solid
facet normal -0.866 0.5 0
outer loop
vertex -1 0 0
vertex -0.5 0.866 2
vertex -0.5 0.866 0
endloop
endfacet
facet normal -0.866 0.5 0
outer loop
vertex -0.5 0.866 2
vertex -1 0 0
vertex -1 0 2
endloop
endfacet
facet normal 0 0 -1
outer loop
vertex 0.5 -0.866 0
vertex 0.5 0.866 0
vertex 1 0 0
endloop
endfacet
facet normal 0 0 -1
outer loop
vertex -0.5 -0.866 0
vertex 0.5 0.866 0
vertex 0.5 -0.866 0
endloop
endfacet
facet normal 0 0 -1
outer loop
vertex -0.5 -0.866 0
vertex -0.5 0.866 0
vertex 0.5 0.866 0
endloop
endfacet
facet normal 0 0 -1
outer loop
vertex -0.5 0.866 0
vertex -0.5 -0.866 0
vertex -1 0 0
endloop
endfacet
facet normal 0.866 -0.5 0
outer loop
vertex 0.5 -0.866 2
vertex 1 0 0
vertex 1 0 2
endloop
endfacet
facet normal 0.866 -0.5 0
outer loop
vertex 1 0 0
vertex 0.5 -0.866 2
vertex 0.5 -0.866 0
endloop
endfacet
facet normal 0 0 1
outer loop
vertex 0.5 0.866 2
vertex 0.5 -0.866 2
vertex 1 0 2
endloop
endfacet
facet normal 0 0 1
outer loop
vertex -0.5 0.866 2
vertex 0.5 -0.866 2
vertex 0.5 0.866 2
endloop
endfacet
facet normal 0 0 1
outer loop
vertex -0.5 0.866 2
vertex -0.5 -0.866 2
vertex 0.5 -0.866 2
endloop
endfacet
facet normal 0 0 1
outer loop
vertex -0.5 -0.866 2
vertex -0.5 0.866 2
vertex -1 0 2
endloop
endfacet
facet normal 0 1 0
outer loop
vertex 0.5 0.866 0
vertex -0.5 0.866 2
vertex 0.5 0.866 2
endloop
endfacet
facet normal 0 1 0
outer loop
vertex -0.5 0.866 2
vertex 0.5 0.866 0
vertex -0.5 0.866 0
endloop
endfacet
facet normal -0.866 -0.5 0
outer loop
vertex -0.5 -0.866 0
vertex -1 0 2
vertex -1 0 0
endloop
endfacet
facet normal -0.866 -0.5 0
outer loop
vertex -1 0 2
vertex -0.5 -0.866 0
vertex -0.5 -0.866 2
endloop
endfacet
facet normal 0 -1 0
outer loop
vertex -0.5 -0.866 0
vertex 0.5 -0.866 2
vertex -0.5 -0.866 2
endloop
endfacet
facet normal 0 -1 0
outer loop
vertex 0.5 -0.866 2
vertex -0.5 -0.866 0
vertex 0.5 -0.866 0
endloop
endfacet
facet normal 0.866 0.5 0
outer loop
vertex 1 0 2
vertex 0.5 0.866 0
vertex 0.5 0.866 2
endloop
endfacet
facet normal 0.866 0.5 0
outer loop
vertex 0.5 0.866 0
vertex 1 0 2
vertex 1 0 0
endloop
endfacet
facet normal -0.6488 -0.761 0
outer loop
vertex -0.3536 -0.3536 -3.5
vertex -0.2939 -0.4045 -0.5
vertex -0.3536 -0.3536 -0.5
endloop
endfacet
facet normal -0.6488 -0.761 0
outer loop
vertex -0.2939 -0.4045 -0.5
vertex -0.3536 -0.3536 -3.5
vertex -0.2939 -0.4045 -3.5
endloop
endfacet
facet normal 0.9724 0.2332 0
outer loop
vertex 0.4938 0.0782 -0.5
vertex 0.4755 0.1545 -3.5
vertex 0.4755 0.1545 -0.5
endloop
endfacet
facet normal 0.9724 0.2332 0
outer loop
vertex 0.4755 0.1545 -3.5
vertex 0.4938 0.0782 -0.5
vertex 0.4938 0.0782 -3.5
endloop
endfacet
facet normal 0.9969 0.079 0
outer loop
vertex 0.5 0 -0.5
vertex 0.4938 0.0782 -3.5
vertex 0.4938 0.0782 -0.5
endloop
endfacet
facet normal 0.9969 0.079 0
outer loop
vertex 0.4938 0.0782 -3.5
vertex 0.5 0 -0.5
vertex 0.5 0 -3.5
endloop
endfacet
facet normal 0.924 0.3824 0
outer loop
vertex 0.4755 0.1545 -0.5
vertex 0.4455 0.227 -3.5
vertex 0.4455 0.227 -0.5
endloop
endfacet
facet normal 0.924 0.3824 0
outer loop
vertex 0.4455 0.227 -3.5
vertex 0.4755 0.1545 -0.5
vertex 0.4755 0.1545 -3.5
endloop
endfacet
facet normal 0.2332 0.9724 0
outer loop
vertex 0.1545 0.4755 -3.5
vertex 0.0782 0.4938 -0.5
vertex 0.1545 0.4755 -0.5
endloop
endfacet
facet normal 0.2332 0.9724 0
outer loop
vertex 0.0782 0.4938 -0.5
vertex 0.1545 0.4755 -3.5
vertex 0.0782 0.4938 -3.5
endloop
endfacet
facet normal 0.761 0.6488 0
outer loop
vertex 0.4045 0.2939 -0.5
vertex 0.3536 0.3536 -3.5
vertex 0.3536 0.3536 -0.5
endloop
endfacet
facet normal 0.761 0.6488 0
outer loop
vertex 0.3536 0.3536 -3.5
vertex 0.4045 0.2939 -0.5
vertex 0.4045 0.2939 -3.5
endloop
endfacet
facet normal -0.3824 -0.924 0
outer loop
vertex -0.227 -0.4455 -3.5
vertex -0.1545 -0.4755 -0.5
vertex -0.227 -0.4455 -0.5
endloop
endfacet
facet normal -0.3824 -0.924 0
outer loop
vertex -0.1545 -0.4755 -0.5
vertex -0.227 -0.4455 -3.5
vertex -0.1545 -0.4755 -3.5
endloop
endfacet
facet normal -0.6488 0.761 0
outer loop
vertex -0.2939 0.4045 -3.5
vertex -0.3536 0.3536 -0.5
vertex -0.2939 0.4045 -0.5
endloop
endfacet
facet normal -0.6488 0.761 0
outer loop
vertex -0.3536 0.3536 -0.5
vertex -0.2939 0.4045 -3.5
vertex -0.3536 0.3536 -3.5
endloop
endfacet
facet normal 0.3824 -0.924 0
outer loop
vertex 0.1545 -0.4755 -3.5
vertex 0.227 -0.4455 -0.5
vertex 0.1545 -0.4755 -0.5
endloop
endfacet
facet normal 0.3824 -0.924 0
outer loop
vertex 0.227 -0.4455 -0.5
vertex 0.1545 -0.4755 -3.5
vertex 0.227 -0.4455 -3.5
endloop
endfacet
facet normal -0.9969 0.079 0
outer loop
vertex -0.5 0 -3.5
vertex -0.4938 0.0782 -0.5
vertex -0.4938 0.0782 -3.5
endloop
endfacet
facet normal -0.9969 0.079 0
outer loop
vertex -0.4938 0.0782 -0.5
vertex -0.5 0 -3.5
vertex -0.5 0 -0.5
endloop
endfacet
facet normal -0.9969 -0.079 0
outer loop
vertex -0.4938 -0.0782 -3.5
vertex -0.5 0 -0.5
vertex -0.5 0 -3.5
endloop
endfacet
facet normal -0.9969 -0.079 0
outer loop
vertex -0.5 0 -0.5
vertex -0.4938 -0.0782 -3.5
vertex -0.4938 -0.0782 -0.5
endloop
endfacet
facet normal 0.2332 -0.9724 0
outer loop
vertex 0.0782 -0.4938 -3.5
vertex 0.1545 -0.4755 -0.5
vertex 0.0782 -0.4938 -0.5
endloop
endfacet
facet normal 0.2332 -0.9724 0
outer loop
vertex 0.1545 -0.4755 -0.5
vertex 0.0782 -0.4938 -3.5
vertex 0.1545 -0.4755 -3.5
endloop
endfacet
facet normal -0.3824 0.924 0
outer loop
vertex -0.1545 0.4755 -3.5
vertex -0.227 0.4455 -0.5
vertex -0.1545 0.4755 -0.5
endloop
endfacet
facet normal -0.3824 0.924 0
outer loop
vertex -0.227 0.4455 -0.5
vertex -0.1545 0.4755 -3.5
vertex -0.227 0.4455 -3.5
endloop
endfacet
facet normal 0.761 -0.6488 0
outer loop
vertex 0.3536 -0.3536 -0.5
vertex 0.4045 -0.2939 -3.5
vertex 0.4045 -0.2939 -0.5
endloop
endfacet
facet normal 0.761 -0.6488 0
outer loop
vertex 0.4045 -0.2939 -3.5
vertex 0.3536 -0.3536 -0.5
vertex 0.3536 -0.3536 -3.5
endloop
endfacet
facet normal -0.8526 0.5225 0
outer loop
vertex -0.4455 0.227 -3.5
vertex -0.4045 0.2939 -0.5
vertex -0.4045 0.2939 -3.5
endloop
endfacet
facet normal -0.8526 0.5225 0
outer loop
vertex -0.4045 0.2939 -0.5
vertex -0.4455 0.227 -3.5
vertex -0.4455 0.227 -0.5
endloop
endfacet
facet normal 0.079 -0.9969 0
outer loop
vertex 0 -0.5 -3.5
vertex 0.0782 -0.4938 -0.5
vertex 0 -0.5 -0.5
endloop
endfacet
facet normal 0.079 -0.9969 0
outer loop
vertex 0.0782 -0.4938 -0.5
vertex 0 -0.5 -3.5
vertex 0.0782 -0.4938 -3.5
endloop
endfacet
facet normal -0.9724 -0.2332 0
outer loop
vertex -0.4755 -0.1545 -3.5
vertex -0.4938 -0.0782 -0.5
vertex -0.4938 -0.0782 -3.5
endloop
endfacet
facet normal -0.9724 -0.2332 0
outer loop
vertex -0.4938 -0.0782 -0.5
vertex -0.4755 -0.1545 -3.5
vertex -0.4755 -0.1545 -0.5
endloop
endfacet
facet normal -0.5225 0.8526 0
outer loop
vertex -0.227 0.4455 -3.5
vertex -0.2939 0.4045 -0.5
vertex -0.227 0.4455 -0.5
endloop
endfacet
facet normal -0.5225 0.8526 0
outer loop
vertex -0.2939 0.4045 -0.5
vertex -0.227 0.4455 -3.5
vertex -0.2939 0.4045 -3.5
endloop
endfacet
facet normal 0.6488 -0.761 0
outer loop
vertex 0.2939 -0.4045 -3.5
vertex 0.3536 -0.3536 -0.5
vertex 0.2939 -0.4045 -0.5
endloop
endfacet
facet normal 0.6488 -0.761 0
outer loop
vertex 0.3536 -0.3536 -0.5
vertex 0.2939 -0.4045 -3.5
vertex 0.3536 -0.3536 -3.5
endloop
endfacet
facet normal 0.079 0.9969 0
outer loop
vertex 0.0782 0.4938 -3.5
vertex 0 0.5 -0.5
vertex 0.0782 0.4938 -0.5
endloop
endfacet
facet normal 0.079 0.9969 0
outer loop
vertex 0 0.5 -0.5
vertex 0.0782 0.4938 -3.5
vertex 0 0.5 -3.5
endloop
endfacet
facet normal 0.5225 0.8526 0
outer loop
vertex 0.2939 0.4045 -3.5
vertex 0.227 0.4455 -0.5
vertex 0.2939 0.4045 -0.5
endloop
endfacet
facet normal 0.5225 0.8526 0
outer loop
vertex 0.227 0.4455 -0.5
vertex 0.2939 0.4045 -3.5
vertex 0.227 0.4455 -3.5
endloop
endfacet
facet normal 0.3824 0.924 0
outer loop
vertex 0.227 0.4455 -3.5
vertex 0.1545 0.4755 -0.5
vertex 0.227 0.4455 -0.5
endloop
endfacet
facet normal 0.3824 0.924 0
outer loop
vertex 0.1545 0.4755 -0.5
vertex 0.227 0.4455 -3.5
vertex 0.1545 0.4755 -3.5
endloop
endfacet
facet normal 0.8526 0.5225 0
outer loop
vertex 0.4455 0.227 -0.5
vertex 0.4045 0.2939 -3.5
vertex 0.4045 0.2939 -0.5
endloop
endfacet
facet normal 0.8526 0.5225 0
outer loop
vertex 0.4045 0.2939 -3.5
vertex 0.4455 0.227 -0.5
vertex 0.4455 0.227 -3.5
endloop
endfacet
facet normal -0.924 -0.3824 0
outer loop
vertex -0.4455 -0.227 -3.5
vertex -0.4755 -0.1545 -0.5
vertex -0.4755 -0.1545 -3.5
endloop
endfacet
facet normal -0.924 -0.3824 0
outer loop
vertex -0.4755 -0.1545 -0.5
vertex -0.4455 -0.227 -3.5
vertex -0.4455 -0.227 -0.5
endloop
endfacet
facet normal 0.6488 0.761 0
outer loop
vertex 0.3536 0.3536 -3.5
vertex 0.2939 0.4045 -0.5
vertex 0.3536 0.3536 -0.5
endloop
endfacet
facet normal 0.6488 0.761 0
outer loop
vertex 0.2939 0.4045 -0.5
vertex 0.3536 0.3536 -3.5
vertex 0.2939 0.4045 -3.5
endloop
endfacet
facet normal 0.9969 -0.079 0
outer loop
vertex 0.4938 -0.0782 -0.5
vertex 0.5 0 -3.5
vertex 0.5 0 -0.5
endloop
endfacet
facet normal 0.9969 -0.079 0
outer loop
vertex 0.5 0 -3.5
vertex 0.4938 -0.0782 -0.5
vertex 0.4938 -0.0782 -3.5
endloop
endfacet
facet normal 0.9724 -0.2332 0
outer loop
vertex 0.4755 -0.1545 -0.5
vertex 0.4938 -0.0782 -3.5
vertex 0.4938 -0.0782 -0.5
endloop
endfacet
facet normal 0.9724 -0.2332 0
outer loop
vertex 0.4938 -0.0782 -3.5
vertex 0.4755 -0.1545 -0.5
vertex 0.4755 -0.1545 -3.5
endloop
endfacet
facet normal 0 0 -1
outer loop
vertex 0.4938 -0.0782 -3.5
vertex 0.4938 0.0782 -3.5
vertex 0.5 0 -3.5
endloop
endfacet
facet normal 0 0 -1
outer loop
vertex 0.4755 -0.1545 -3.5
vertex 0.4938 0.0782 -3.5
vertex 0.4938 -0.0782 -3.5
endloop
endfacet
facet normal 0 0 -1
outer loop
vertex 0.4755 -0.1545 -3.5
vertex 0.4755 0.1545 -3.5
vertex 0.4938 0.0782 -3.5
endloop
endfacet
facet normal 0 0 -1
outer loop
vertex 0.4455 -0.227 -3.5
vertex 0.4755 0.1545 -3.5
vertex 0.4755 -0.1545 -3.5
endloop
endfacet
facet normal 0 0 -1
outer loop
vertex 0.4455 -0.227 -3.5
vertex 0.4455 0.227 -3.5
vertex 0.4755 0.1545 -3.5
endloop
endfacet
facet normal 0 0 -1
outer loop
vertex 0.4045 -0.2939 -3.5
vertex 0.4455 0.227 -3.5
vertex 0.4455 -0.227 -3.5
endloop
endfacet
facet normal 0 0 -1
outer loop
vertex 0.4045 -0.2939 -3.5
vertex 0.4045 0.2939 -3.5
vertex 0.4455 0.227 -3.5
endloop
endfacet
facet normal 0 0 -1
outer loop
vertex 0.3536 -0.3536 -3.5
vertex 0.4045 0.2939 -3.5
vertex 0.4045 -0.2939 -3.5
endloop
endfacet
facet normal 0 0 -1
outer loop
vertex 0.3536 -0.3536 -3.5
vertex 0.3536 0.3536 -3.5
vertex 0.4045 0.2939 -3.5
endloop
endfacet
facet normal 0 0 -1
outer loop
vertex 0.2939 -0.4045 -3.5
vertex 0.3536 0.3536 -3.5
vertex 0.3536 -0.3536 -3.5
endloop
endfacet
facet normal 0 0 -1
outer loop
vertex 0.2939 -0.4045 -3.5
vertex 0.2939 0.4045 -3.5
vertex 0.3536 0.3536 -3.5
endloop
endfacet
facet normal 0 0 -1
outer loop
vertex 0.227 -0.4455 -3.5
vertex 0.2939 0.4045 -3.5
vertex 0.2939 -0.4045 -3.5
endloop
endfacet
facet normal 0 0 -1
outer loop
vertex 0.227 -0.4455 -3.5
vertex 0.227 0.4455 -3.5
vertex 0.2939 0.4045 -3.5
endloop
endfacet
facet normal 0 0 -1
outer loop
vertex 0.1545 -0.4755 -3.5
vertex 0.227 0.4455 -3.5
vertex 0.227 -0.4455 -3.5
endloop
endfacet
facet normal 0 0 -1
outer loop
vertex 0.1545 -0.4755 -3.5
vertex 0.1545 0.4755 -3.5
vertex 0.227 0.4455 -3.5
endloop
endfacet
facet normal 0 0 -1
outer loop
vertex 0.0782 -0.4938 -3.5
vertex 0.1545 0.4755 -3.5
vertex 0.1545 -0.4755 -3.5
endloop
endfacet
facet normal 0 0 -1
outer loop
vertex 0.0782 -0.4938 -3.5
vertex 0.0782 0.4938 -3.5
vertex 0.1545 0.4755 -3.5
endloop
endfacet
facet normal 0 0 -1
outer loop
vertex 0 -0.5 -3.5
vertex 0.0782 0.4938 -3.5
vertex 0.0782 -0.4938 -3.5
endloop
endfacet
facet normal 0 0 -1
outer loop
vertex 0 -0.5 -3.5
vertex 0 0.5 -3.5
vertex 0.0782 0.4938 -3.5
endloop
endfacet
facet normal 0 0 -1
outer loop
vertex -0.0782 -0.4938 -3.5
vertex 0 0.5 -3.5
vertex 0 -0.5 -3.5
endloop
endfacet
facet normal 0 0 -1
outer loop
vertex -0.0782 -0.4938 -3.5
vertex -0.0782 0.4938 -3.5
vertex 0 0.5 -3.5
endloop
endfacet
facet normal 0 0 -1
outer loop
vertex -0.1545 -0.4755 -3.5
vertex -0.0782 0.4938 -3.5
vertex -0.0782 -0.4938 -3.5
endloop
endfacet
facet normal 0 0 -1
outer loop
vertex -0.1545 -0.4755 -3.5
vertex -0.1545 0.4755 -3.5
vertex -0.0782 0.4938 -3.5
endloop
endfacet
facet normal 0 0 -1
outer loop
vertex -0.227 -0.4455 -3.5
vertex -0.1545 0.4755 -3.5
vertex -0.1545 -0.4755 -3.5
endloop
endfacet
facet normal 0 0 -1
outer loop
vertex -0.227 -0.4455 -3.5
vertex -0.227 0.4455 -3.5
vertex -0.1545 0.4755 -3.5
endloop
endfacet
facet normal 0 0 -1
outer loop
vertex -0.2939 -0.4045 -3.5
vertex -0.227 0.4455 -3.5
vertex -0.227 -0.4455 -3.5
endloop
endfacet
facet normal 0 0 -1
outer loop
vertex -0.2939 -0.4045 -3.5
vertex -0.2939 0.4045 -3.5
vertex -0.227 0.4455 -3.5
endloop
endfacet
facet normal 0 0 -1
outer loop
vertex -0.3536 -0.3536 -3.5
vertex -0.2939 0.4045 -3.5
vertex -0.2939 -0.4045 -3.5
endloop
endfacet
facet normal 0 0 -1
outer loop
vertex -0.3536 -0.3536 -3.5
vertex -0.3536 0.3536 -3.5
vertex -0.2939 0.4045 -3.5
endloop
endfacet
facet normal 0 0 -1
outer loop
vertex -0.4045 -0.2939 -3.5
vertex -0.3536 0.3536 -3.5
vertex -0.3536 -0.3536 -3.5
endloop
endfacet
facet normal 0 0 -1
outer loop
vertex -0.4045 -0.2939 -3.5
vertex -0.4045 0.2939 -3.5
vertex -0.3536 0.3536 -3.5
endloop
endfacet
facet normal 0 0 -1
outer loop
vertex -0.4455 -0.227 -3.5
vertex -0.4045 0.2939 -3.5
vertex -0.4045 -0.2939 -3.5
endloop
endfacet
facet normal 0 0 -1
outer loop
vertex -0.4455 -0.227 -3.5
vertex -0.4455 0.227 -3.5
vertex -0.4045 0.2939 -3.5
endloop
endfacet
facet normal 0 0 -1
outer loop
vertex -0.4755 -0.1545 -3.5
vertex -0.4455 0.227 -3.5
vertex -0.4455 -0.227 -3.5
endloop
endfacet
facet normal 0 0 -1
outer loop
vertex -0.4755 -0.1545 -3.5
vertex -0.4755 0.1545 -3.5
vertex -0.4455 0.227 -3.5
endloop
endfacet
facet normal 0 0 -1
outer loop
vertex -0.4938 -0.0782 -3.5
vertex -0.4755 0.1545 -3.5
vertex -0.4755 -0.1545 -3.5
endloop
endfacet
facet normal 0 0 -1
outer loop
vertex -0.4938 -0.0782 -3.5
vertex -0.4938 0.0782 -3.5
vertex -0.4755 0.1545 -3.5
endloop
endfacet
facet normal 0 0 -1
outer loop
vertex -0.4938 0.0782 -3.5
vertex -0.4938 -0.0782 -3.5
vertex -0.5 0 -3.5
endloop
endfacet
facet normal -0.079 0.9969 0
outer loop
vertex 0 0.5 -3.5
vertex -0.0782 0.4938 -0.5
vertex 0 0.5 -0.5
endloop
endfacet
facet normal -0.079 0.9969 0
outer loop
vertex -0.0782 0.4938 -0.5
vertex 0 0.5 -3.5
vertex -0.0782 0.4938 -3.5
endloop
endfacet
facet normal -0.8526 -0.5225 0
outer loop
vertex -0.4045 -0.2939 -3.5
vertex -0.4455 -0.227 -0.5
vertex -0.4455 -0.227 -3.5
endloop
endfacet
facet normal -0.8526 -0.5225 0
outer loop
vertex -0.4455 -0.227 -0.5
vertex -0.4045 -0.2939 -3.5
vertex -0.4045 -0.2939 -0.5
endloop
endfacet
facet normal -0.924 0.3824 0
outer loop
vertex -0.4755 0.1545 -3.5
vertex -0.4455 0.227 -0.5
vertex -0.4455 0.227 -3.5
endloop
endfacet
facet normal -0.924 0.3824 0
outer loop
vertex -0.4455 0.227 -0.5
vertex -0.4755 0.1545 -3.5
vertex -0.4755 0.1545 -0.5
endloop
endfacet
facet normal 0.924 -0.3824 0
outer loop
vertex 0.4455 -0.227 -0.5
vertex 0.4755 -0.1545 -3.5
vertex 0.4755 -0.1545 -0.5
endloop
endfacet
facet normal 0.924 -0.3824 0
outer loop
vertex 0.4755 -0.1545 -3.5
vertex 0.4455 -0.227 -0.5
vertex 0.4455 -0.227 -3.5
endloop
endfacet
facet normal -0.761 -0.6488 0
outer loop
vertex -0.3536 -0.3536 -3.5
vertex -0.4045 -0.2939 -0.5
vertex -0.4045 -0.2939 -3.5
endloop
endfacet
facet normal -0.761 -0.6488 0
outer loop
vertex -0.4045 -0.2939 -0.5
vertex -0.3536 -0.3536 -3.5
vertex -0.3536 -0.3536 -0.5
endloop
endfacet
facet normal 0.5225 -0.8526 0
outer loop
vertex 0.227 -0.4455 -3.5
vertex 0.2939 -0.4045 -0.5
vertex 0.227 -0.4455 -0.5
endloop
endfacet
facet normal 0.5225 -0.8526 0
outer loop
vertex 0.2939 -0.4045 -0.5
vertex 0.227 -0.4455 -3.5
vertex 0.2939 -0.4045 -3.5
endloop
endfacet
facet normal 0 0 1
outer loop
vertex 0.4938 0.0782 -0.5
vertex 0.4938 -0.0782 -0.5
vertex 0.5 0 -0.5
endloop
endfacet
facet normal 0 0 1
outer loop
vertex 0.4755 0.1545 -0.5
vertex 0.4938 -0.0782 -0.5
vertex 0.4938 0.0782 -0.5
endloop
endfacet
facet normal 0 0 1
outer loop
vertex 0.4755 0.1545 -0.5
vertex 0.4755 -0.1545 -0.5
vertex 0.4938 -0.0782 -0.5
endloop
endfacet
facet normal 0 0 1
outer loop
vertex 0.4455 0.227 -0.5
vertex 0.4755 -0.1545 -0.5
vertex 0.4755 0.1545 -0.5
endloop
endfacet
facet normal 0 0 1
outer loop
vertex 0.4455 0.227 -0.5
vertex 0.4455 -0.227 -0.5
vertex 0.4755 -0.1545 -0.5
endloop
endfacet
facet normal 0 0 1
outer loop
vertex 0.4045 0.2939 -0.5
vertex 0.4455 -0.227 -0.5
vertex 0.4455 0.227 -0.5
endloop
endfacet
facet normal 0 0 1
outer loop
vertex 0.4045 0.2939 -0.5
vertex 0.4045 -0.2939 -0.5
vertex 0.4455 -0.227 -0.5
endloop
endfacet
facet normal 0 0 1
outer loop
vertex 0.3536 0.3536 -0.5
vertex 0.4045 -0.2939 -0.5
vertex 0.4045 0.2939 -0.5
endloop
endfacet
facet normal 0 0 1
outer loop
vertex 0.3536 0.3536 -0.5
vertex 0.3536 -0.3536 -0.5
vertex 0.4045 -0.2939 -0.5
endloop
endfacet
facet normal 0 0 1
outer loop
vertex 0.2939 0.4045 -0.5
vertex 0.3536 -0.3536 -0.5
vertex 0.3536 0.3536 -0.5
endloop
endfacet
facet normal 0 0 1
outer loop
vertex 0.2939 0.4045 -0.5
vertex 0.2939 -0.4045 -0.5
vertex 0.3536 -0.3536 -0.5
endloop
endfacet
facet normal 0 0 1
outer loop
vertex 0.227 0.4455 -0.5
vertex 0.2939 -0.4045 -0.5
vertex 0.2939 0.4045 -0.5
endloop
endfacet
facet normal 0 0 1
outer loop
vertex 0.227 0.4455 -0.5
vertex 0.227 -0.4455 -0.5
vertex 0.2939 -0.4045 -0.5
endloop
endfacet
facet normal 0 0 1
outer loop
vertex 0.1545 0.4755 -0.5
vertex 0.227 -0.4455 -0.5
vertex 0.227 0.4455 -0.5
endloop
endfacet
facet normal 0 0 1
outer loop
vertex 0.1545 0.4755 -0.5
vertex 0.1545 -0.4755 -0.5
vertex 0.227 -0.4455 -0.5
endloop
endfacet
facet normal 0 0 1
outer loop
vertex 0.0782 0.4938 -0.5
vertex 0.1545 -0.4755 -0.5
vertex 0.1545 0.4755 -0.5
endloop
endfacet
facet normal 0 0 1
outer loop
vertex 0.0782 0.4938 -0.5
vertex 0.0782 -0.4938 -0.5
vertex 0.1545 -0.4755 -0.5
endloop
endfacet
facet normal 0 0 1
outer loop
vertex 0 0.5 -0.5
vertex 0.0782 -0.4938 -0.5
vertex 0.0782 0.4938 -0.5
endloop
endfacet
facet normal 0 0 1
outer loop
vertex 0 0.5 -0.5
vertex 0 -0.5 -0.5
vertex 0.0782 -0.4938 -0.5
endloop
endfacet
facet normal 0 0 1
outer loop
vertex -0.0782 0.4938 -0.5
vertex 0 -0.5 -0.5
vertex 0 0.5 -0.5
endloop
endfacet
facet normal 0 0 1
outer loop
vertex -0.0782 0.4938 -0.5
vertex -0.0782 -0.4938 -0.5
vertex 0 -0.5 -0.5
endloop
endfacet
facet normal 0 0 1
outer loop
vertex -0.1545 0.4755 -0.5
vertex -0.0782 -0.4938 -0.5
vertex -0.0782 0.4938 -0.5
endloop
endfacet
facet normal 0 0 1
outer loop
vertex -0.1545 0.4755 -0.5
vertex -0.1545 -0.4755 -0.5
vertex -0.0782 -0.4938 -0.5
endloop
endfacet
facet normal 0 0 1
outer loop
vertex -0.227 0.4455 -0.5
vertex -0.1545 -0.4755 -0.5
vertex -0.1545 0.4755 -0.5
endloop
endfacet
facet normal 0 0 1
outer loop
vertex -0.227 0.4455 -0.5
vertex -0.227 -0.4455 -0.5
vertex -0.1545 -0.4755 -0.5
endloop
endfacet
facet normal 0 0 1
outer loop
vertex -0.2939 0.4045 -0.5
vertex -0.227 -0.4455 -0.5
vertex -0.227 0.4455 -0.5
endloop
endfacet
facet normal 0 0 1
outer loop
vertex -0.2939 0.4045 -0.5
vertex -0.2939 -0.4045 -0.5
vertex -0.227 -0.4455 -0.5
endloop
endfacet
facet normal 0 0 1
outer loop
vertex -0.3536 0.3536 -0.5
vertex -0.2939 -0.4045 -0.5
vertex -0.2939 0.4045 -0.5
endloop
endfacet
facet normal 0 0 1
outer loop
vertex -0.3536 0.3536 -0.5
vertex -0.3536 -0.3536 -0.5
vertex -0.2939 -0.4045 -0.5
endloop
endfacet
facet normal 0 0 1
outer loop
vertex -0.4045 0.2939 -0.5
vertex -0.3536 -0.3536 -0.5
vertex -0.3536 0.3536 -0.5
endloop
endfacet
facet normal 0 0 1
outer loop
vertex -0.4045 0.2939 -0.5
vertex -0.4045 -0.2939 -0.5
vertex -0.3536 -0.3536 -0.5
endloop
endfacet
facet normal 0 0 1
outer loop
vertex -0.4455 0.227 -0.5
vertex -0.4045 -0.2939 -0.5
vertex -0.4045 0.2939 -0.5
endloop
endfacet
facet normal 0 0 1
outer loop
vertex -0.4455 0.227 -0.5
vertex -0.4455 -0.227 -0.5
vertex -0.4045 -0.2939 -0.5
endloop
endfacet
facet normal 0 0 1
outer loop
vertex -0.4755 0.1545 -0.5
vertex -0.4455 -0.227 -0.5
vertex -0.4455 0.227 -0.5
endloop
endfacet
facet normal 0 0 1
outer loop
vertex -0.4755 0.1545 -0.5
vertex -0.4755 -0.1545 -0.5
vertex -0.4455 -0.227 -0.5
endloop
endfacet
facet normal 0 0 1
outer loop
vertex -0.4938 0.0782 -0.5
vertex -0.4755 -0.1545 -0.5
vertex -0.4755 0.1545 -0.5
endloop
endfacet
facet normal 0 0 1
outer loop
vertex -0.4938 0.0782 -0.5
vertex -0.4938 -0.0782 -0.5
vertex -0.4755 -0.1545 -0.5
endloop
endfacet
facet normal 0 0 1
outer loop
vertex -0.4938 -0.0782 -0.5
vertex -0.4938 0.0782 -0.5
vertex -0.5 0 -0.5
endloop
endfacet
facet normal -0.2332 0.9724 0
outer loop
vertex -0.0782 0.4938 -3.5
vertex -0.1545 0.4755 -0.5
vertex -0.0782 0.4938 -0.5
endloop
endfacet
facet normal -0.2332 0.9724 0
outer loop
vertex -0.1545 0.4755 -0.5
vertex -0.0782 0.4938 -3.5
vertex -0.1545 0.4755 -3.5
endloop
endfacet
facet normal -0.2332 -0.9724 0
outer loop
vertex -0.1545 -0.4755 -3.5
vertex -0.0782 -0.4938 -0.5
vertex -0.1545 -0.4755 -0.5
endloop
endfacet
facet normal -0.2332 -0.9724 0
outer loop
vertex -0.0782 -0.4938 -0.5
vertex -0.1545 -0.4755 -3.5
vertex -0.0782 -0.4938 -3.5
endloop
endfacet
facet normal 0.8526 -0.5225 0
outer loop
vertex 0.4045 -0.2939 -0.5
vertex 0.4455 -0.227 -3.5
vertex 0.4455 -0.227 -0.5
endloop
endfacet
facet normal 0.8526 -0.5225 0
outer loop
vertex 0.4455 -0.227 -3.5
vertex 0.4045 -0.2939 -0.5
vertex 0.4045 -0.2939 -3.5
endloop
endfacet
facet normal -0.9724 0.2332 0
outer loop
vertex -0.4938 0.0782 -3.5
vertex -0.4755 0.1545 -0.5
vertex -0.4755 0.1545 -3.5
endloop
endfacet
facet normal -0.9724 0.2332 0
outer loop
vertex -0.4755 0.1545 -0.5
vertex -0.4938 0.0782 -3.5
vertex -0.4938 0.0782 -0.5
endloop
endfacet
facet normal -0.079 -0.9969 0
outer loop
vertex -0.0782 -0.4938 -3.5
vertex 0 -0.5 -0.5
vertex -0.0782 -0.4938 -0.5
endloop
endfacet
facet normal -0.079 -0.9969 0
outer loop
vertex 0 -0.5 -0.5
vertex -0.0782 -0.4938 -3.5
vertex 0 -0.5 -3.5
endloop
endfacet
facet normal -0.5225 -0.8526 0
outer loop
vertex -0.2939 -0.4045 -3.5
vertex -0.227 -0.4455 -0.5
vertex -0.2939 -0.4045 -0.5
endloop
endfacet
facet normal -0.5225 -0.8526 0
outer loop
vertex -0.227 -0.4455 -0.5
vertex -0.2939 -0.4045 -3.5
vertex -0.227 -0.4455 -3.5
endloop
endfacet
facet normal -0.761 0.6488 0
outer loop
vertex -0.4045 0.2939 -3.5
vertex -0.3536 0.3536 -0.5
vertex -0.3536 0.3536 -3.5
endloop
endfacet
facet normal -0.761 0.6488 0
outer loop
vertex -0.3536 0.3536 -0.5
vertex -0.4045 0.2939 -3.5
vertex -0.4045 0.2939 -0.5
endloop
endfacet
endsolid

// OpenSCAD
module Screw(){

    module regular_polygon(order = 6, r=1){
         angles=[ for (i = [0:order-1]) i*(360/order) ];
         coords=[ for (th=angles) [r*cos(th), r*sin(th)] ];
         polygon(coords);
     }
        
     color("#a8b0b2"){
     linear_extrude(height=2)
       regular_polygon(order = 6);

     translate([0,0,-3.5])
     cylinder(3,0.5,0.5, $fn = 40);
     }
     
}
 
Screw();

// Written by Nicolì Angelo (Gengio) 2024: 
// MIT License

//Permission is hereby granted, free of charge, to any person obtaining a copy of this software and associated documentation files (the "Software"), to deal in the Software without restriction, including without limitation the rights to use, copy, modify, merge, publish, distribute, sublicense, and/or sell copies of the Software, and to permit persons to whom the Software is furnished to do so, subject to the following conditions:

//The above copyright notice and this permission notice shall be included in all copies or substantial portions of the Software.

//THE SOFTWARE IS PROVIDED "AS IS", WITHOUT WARRANTY OF ANY KIND, EXPRESS OR IMPLIED, INCLUDING BUT NOT LIMITED TO THE WARRANTIES OF MERCHANTABILITY, FITNESS FOR A PARTICULAR PURPOSE AND NONINFRINGEMENT. IN NO EVENT SHALL THE AUTHORS OR COPYRIGHT HOLDERS BE LIABLE FOR ANY CLAIM, DAMAGES OR OTHER LIABILITY, WHETHER IN AN ACTION OF CONTRACT, TORT OR OTHERWISE, ARISING FROM, OUT OF OR IN CONNECTION WITH THE SOFTWARE OR THE USE OR OTHER DEALINGS IN THE SOFTWARE.
